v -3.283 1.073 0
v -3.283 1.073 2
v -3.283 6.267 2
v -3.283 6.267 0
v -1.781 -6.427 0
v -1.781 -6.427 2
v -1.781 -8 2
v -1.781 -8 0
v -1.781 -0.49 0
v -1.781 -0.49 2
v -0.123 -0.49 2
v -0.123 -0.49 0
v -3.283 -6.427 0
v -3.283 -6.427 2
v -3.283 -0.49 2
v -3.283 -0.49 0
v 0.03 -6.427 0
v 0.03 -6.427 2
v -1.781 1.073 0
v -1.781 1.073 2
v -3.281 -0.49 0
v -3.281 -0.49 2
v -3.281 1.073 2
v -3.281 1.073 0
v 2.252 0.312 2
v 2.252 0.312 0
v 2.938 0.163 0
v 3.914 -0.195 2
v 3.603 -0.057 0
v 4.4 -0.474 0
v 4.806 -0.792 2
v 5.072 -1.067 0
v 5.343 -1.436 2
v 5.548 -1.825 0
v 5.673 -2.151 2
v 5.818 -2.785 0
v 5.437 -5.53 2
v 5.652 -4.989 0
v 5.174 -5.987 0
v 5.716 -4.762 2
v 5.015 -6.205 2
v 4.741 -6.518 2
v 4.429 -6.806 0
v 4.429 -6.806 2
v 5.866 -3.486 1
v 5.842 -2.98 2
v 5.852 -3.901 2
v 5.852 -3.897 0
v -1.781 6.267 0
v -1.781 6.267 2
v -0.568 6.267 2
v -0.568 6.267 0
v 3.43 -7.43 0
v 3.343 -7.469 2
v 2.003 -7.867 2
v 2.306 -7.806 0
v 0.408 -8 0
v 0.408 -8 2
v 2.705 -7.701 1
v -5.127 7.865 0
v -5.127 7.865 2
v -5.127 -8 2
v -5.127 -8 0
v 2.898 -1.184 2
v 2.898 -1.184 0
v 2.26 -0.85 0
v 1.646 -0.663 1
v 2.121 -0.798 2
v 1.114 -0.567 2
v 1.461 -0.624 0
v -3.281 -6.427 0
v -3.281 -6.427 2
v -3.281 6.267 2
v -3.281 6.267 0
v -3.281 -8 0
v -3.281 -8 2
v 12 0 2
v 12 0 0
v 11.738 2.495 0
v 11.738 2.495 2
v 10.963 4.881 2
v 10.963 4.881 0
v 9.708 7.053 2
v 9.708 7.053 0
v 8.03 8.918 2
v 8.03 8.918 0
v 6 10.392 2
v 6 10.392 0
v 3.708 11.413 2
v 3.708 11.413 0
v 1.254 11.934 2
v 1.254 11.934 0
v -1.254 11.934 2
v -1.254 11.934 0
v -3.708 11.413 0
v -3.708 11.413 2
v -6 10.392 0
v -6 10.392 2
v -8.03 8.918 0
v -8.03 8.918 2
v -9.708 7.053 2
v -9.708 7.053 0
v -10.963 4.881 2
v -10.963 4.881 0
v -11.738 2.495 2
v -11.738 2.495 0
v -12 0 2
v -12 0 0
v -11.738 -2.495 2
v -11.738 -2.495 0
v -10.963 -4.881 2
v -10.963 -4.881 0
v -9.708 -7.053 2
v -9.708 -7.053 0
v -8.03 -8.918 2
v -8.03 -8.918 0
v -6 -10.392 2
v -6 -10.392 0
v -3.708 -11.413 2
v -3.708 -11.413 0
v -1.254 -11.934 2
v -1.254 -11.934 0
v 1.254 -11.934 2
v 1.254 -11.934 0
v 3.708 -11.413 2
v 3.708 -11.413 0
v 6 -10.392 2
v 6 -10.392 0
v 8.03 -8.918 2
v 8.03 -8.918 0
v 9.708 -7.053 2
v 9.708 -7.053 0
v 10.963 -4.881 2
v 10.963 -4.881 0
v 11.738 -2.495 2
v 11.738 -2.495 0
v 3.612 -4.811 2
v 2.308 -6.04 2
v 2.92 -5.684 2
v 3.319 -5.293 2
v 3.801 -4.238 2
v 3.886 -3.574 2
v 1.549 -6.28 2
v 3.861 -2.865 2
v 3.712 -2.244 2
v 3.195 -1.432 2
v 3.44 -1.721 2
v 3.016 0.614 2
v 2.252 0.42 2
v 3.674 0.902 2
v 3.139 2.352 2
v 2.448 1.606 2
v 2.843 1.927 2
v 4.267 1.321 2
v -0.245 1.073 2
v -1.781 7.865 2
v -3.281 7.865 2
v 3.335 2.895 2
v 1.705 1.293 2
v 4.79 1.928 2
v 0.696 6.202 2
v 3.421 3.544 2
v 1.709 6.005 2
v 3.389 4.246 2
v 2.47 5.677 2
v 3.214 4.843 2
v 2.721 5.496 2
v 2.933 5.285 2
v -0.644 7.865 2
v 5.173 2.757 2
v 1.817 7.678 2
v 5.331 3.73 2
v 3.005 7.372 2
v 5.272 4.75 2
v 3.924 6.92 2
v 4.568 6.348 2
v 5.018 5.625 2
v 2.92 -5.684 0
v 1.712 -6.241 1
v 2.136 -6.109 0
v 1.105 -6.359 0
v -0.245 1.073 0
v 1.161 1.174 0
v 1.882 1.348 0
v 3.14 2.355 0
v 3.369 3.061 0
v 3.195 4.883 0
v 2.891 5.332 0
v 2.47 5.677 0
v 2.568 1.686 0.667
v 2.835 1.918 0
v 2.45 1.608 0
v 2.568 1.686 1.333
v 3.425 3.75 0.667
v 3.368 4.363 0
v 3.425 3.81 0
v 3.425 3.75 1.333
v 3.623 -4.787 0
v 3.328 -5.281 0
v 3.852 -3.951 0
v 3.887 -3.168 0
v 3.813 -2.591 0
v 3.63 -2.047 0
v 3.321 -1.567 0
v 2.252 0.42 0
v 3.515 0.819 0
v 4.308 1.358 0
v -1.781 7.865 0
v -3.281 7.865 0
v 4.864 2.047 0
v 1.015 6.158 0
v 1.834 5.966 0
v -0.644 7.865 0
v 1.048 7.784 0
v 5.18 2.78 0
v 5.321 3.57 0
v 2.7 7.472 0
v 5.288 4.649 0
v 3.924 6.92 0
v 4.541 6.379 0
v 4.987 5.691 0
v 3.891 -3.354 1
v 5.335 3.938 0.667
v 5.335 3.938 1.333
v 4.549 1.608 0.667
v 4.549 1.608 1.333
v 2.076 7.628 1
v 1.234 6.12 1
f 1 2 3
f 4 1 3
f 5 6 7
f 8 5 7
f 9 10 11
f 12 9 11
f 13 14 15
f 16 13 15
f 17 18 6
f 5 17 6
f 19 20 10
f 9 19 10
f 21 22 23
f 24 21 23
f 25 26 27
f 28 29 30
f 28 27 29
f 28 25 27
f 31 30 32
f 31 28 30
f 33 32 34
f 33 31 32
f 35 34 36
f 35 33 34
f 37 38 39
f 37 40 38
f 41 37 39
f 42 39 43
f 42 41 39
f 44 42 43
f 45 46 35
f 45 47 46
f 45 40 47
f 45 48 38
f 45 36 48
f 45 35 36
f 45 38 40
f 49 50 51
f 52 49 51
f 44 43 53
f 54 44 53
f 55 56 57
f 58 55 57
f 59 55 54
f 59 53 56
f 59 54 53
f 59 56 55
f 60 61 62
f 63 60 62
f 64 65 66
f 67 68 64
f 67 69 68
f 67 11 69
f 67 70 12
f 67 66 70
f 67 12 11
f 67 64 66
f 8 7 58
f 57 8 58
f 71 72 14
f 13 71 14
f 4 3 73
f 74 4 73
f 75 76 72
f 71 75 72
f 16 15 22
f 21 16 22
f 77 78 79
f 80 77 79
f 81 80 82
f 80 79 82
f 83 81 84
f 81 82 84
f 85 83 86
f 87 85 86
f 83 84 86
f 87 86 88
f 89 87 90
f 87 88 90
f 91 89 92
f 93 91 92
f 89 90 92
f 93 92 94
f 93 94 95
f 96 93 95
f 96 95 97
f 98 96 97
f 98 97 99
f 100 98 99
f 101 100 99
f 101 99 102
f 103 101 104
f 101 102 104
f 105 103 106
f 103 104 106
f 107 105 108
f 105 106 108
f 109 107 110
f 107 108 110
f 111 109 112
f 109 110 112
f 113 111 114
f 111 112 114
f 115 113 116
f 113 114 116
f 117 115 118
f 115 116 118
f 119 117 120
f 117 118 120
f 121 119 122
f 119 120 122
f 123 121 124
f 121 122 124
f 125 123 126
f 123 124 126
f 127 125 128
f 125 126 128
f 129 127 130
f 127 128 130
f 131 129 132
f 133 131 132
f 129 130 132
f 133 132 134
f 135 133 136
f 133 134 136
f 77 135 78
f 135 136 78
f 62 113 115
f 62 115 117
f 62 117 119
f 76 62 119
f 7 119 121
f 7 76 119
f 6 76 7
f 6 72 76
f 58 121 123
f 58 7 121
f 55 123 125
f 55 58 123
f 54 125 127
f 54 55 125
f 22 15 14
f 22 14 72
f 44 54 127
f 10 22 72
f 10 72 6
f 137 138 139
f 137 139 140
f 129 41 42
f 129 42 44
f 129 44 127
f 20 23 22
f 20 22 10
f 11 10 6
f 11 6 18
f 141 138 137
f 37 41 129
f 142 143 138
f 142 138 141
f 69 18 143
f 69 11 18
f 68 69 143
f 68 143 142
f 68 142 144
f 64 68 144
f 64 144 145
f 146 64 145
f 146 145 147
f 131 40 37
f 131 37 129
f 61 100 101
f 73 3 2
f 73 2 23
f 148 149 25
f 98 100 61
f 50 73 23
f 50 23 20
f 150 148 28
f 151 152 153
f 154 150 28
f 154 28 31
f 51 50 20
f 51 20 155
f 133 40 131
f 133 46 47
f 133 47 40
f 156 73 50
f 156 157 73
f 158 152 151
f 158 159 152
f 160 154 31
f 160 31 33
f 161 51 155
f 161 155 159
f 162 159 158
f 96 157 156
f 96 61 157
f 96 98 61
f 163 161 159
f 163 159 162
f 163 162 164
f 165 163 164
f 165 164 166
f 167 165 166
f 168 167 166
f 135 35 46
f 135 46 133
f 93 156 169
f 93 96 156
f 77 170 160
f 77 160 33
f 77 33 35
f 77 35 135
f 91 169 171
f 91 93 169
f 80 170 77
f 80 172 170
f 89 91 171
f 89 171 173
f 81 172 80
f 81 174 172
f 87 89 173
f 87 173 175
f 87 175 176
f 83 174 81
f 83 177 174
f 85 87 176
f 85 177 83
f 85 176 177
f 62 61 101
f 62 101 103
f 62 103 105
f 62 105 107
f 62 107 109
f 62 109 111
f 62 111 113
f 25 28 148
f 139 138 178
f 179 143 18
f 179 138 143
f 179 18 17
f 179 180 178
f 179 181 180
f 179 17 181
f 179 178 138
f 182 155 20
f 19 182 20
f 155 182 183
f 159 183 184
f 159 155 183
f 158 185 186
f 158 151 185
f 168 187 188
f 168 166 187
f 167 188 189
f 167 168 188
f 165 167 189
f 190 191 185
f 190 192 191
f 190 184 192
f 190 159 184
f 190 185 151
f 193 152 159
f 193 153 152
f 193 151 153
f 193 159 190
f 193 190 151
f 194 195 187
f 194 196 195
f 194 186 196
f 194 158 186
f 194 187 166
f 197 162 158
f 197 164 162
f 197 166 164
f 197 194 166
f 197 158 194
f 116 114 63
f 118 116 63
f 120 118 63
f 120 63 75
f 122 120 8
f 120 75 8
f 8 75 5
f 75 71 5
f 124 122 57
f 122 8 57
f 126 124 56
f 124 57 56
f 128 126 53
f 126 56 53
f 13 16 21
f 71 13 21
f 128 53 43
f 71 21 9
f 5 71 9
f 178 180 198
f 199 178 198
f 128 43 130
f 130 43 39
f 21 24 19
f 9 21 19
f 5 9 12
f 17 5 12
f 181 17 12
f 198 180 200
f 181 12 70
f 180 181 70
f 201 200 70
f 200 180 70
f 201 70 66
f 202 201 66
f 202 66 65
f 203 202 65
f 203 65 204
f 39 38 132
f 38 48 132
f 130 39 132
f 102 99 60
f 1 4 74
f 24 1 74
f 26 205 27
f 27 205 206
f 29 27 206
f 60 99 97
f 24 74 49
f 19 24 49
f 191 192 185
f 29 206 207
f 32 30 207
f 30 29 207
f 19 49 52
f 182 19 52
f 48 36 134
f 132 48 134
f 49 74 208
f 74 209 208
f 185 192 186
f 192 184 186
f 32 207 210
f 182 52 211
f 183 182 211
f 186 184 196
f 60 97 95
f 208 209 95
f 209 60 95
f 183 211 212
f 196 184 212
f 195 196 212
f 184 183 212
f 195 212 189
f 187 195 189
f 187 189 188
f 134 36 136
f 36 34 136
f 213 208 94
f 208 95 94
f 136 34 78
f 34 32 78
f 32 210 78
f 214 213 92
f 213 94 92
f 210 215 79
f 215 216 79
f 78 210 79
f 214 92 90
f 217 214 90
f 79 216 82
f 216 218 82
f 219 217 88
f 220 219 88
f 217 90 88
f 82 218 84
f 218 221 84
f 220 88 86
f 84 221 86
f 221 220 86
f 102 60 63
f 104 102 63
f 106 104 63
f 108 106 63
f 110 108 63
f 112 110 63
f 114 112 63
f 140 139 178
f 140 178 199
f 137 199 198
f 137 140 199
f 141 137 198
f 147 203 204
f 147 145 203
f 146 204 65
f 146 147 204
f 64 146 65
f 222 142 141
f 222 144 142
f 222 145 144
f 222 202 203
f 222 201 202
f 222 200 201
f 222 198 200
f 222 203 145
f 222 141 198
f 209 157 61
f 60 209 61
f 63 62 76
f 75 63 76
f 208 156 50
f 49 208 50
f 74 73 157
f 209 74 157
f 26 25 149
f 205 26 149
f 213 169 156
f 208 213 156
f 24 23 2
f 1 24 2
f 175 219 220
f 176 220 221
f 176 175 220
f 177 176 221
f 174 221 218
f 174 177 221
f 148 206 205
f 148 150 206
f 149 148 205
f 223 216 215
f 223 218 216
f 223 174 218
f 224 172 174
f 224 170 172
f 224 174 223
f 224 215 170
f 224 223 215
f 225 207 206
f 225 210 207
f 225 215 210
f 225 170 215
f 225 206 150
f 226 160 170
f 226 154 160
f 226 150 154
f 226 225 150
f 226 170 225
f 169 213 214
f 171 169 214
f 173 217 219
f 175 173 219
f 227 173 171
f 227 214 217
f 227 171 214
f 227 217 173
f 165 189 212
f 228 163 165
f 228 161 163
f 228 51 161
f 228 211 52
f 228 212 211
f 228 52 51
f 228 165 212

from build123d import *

# Parameters (mm, degrees)
F0_R     = 12
F1_DEPTH = 2
F3_DEPTH = 25


with BuildPart() as f1:
    # F0 (on Top) → F1 (new body)
    with BuildSketch(Plane.XY):
        Circle(F0_R)
    extrude(amount=F1_DEPTH)

    # F2 (on face) → F3 (cut)
    with BuildSketch(Plane.XY.offset(2)):
        Polygon((-3.2808869146, 6.2673611111), (-3.2808869146, 7.8645833333), (-5.1267361111, 7.8645833333), (-5.1267361111, -8), (-3.2808869146, -8), (-3.2808869146, -6.4270833333), (-3.2829861111, -6.4270833333), (-3.2829861111, -0.4895833333), (-3.2808869146, -0.4895833333), (-3.2808869146, 1.0729166667), (-3.2829861111, 1.0729166667), (-3.2829861111, 6.2673611111), align=None)
        with BuildLine():
            Line((-0.6440972222, 7.8645833333), (-1.7808869146, 7.8645833333))
            Line((-1.7808869146, 7.8645833333), (-1.7808869146, 6.2673611111))
            Line((-1.7808869146, 6.2673611111), (-0.5677083333, 6.2673611111))
            add(Edge.make_bspline(
                [(2.4704861111, 5.6770833333), (1.515625, 6.2673611111), (-0.5677083333, 6.2673611111)],
                knots=[0, 0, 0, 1, 1, 1], degree=2))
            add(Edge.make_bspline(
                [(3.4253472222, 3.75), (3.4253472222, 5.0868055556), (2.4704861111, 5.6770833333)],
                knots=[0, 0, 0, 1, 1, 1], degree=2))
            add(Edge.make_bspline(
                [(2.5677083333, 1.6857638889), (3.4253472222, 2.2986111111), (3.4253472222, 3.75)],
                knots=[0, 0, 0, 1, 1, 1], degree=2))
            add(Edge.make_bspline(
                [(-0.2447916667, 1.0729166667), (1.7100694444, 1.0729166667), (2.5677083333, 1.6857638889)],
                knots=[0, 0, 0, 1, 1, 1], degree=2))
            Line((-0.2447916667, 1.0729166667), (-1.7808869146, 1.0729166667))
            Line((-1.7808869146, 1.0729166667), (-1.7808869146, -0.4895833333))
            Line((-1.7808869146, -0.4895833333), (-0.1232638889, -0.4895833333))
            add(Edge.make_bspline(
                [(2.8975694444, -1.1840277778), (1.9045138889, -0.4895833333), (-0.1232638889, -0.4895833333)],
                knots=[0, 0, 0, 1, 1, 1], degree=2))
            add(Edge.make_bspline(
                [(3.890625, -3.3541666667), (3.890625, -1.8784722222), (2.8975694444, -1.1840277778)],
                knots=[0, 0, 0, 1, 1, 1], degree=2))
            add(Edge.make_bspline(
                [(2.9201388889, -5.6840277778), (3.890625, -4.9409722222), (3.890625, -3.3541666667)],
                knots=[0, 0, 0, 1, 1, 1], degree=2))
            add(Edge.make_bspline(
                [(0.0295138889, -6.4270833333), (1.9496527778, -6.4270833333), (2.9201388889, -5.6840277778)],
                knots=[0, 0, 0, 1, 1, 1], degree=2))
            Line((0.0295138889, -6.4270833333), (-1.7808869146, -6.4270833333))
            Line((-1.7808869146, -6.4270833333), (-1.7808869146, -8))
            Line((-1.7808869146, -8), (0.4079861111, -8))
            add(Edge.make_bspline(
                [(4.4288194444, -6.8055555556), (2.9913194444, -8), (0.4079861111, -8)],
                knots=[0, 0, 0, 1, 1, 1], degree=2))
            add(Edge.make_bspline(
                [(5.8663194444, -3.4861111111), (5.8663194444, -5.6111111111), (4.4288194444, -6.8055555556)],
                knots=[0, 0, 0, 1, 1, 1], degree=2))
            add(Edge.make_bspline(
                [(2.2517361111, 0.3125), (5.8663194444, -0.3055555556), (5.8663194444, -3.4861111111)],
                knots=[0, 0, 0, 1, 1, 1], degree=2))
            Line((2.2517361111, 0.3125), (2.2517361111, 0.4201388889))
            add(Edge.make_bspline(
                [(4.5486111111, 1.6076388889), (3.7621527778, 0.6909722222), (2.2517361111, 0.4201388889)],
                knots=[0, 0, 0, 1, 1, 1], degree=2))
            add(Edge.make_bspline(
                [(5.3350694444, 3.9375), (5.3350694444, 2.5243055556), (4.5486111111, 1.6076388889)],
                knots=[0, 0, 0, 1, 1, 1], degree=2))
            add(Edge.make_bspline(
                [(3.9236111111, 6.9201388889), (5.3350694444, 5.9756944444), (5.3350694444, 3.9375)],
                knots=[0, 0, 0, 1, 1, 1], degree=2))
            add(Edge.make_bspline(
                [(-0.6440972222, 7.8645833333), (2.5121527778, 7.8645833333), (3.9236111111, 6.9201388889)],
                knots=[0, 0, 0, 1, 1, 1], degree=2))
        make_face()
    extrude(amount=-F3_DEPTH, mode=Mode.SUBTRACT)


solid = f1.part
